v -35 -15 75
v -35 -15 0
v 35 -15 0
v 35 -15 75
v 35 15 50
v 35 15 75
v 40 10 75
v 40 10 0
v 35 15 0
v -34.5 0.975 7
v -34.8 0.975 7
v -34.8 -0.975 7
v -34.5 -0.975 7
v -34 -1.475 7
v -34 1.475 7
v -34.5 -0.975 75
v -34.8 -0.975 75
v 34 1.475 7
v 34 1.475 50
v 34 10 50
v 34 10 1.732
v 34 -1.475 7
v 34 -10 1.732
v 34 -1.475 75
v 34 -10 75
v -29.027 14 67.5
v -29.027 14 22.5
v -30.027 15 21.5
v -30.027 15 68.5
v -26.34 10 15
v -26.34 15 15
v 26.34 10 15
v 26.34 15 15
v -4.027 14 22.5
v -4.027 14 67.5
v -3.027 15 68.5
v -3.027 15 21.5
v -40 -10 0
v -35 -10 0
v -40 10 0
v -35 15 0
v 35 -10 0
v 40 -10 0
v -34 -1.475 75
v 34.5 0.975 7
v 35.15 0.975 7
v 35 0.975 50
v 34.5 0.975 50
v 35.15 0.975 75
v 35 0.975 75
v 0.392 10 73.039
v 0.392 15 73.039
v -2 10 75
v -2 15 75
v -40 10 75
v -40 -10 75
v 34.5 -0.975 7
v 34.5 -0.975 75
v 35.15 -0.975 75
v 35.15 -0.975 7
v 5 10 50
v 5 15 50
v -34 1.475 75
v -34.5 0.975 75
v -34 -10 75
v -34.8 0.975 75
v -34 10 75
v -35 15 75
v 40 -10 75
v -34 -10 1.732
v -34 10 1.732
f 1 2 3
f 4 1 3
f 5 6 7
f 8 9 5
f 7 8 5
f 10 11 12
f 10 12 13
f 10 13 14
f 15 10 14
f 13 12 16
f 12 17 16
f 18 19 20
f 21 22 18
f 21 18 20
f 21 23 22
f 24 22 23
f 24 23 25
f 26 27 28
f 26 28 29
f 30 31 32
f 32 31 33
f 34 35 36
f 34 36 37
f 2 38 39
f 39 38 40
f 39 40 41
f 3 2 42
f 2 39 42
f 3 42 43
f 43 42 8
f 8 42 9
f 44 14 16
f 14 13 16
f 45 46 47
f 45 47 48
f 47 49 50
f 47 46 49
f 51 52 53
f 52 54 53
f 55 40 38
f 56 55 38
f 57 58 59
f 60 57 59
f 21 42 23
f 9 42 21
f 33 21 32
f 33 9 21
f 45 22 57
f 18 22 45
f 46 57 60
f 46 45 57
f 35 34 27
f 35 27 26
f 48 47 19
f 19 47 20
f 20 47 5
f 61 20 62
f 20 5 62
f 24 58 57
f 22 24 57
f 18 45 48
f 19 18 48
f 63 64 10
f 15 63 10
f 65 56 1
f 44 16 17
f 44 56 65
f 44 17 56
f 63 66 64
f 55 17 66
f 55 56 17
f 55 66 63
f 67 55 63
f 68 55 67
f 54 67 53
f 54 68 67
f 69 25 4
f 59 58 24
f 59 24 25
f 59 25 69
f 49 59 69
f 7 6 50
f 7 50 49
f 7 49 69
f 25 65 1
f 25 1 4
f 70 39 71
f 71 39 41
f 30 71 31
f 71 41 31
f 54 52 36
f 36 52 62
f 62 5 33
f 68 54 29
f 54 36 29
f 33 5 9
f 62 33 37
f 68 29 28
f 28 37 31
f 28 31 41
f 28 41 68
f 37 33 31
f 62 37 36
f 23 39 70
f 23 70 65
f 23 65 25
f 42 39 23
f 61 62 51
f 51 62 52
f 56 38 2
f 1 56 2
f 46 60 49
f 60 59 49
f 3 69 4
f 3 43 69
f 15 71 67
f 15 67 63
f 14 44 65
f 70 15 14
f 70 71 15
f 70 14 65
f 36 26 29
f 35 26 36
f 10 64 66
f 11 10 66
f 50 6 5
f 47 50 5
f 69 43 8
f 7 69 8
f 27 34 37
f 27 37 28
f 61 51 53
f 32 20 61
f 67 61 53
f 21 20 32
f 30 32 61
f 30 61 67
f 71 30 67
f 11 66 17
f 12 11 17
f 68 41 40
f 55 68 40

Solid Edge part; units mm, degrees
sketch "Sketch1" plane through (0, 0, 0) normal (0, 0, 1) x (1, 0, 0)
  line L0 (-34, -10) -> (34, -10)
  line L1 (34, -10) -> (34, 10)
  line L2 (34, 10) -> (-34, 10)
  line L3 (-34, 10) -> (-34, -10)
  line L4 (-35, -15) -> (35, -15)
  line L5 (40, -10) -> (35, -15)
  line L6 (40, -10) -> (40, 10)
  line L7 (35, 15) -> (40, 10)
  line L8 (35, 15) -> (-35, 15)
  line L9 (-35, 15) -> (-40, 10)
  line L10 (-40, 10) -> (-40, -10)
  line L11 (-40, -10) -> (-35, -15)
extrude "Protrusion1" add sketch "Sketch1" along normal blind 75
sketch "Sketch2" plane through (0, 0, 75) normal (0, 0, 1) x (1, 0, 0)
  line L0 (-34.8, -0.975) -> (35.15, -0.975)
  line L1 (35.15, -0.975) -> (35.15, 0.975)
  line L2 (35.15, 0.975) -> (-34.8, 0.975)
  line L3 (-34.8, 0.975) -> (-34.8, -0.975)
extrude "Wycięcie_1" cut sketch "Sketch2" against normal blind 68
chamfer "Faza_1" distance 0.5 angle 45 4 edges at (-34, -0.975, 41) (-34, 0.975, 41) (34, -0.975, 41) (34, 0.975, 41)
sketch "Sketch3" plane through (0, 15, 32.5) normal (0, 1, 0) x (-1, 0, 0)
  line L0 (-35, 17.5) -> (-5, 17.5)
  line L1 (-35, 42.5) -> (-35, 17.5)
  line L2 (-35, 42.5) -> (0, 42.5)
  line L3 (-5, 17.5) -> (0, 42.5)
extrude "Cutout1" cut sketch "Sketch3" against normal up to next
sketch "Sketch4" plane through (0, 15, 32.5) normal (0, 1, 0) x (-1, 0, 0)
  line L0 (-35, -32.5) -> (35, -32.5)
  line L1 (35, -32.5) -> (26.3397, -17.5)
  line L2 (26.3397, -17.5) -> (-26.3397, -17.5)
  line L3 (-35, -32.5) -> (-26.3397, -17.5)
extrude "Cutout2" cut sketch "Sketch4" against normal up to vertex (25 mm away)
sketch "Sketch5" plane through (0, 15, 32.5) normal (0, 1, 0) x (0, 0, 1)
  line L0 (-10, -29.027) -> (35, -29.027)
  line L1 (35, -29.027) -> (35, -4.027)
  line L2 (35, -4.027) -> (-10, -4.027)
  line L3 (-10, -4.027) -> (-10, -29.027)
  dimension "D1" = 7.5
  dimension "D2" = 7.5
extrude "Wycięcie_4" cut sketch "Sketch5" against normal blind 1
chamfer "Faza_3" distance 1 angle 45 4 edges at (-4.027, 15, 45) (-16.527, 15, 22.5) (-29.027, 15, 45) (-16.527, 15, 67.5)
chamfer "Chamfer1" [suppressed]
chamfer "Faza_7" [suppressed]
chamfer "Faza_8" distance 2 angle 45 1 edges at (0, 12.5, 75)
